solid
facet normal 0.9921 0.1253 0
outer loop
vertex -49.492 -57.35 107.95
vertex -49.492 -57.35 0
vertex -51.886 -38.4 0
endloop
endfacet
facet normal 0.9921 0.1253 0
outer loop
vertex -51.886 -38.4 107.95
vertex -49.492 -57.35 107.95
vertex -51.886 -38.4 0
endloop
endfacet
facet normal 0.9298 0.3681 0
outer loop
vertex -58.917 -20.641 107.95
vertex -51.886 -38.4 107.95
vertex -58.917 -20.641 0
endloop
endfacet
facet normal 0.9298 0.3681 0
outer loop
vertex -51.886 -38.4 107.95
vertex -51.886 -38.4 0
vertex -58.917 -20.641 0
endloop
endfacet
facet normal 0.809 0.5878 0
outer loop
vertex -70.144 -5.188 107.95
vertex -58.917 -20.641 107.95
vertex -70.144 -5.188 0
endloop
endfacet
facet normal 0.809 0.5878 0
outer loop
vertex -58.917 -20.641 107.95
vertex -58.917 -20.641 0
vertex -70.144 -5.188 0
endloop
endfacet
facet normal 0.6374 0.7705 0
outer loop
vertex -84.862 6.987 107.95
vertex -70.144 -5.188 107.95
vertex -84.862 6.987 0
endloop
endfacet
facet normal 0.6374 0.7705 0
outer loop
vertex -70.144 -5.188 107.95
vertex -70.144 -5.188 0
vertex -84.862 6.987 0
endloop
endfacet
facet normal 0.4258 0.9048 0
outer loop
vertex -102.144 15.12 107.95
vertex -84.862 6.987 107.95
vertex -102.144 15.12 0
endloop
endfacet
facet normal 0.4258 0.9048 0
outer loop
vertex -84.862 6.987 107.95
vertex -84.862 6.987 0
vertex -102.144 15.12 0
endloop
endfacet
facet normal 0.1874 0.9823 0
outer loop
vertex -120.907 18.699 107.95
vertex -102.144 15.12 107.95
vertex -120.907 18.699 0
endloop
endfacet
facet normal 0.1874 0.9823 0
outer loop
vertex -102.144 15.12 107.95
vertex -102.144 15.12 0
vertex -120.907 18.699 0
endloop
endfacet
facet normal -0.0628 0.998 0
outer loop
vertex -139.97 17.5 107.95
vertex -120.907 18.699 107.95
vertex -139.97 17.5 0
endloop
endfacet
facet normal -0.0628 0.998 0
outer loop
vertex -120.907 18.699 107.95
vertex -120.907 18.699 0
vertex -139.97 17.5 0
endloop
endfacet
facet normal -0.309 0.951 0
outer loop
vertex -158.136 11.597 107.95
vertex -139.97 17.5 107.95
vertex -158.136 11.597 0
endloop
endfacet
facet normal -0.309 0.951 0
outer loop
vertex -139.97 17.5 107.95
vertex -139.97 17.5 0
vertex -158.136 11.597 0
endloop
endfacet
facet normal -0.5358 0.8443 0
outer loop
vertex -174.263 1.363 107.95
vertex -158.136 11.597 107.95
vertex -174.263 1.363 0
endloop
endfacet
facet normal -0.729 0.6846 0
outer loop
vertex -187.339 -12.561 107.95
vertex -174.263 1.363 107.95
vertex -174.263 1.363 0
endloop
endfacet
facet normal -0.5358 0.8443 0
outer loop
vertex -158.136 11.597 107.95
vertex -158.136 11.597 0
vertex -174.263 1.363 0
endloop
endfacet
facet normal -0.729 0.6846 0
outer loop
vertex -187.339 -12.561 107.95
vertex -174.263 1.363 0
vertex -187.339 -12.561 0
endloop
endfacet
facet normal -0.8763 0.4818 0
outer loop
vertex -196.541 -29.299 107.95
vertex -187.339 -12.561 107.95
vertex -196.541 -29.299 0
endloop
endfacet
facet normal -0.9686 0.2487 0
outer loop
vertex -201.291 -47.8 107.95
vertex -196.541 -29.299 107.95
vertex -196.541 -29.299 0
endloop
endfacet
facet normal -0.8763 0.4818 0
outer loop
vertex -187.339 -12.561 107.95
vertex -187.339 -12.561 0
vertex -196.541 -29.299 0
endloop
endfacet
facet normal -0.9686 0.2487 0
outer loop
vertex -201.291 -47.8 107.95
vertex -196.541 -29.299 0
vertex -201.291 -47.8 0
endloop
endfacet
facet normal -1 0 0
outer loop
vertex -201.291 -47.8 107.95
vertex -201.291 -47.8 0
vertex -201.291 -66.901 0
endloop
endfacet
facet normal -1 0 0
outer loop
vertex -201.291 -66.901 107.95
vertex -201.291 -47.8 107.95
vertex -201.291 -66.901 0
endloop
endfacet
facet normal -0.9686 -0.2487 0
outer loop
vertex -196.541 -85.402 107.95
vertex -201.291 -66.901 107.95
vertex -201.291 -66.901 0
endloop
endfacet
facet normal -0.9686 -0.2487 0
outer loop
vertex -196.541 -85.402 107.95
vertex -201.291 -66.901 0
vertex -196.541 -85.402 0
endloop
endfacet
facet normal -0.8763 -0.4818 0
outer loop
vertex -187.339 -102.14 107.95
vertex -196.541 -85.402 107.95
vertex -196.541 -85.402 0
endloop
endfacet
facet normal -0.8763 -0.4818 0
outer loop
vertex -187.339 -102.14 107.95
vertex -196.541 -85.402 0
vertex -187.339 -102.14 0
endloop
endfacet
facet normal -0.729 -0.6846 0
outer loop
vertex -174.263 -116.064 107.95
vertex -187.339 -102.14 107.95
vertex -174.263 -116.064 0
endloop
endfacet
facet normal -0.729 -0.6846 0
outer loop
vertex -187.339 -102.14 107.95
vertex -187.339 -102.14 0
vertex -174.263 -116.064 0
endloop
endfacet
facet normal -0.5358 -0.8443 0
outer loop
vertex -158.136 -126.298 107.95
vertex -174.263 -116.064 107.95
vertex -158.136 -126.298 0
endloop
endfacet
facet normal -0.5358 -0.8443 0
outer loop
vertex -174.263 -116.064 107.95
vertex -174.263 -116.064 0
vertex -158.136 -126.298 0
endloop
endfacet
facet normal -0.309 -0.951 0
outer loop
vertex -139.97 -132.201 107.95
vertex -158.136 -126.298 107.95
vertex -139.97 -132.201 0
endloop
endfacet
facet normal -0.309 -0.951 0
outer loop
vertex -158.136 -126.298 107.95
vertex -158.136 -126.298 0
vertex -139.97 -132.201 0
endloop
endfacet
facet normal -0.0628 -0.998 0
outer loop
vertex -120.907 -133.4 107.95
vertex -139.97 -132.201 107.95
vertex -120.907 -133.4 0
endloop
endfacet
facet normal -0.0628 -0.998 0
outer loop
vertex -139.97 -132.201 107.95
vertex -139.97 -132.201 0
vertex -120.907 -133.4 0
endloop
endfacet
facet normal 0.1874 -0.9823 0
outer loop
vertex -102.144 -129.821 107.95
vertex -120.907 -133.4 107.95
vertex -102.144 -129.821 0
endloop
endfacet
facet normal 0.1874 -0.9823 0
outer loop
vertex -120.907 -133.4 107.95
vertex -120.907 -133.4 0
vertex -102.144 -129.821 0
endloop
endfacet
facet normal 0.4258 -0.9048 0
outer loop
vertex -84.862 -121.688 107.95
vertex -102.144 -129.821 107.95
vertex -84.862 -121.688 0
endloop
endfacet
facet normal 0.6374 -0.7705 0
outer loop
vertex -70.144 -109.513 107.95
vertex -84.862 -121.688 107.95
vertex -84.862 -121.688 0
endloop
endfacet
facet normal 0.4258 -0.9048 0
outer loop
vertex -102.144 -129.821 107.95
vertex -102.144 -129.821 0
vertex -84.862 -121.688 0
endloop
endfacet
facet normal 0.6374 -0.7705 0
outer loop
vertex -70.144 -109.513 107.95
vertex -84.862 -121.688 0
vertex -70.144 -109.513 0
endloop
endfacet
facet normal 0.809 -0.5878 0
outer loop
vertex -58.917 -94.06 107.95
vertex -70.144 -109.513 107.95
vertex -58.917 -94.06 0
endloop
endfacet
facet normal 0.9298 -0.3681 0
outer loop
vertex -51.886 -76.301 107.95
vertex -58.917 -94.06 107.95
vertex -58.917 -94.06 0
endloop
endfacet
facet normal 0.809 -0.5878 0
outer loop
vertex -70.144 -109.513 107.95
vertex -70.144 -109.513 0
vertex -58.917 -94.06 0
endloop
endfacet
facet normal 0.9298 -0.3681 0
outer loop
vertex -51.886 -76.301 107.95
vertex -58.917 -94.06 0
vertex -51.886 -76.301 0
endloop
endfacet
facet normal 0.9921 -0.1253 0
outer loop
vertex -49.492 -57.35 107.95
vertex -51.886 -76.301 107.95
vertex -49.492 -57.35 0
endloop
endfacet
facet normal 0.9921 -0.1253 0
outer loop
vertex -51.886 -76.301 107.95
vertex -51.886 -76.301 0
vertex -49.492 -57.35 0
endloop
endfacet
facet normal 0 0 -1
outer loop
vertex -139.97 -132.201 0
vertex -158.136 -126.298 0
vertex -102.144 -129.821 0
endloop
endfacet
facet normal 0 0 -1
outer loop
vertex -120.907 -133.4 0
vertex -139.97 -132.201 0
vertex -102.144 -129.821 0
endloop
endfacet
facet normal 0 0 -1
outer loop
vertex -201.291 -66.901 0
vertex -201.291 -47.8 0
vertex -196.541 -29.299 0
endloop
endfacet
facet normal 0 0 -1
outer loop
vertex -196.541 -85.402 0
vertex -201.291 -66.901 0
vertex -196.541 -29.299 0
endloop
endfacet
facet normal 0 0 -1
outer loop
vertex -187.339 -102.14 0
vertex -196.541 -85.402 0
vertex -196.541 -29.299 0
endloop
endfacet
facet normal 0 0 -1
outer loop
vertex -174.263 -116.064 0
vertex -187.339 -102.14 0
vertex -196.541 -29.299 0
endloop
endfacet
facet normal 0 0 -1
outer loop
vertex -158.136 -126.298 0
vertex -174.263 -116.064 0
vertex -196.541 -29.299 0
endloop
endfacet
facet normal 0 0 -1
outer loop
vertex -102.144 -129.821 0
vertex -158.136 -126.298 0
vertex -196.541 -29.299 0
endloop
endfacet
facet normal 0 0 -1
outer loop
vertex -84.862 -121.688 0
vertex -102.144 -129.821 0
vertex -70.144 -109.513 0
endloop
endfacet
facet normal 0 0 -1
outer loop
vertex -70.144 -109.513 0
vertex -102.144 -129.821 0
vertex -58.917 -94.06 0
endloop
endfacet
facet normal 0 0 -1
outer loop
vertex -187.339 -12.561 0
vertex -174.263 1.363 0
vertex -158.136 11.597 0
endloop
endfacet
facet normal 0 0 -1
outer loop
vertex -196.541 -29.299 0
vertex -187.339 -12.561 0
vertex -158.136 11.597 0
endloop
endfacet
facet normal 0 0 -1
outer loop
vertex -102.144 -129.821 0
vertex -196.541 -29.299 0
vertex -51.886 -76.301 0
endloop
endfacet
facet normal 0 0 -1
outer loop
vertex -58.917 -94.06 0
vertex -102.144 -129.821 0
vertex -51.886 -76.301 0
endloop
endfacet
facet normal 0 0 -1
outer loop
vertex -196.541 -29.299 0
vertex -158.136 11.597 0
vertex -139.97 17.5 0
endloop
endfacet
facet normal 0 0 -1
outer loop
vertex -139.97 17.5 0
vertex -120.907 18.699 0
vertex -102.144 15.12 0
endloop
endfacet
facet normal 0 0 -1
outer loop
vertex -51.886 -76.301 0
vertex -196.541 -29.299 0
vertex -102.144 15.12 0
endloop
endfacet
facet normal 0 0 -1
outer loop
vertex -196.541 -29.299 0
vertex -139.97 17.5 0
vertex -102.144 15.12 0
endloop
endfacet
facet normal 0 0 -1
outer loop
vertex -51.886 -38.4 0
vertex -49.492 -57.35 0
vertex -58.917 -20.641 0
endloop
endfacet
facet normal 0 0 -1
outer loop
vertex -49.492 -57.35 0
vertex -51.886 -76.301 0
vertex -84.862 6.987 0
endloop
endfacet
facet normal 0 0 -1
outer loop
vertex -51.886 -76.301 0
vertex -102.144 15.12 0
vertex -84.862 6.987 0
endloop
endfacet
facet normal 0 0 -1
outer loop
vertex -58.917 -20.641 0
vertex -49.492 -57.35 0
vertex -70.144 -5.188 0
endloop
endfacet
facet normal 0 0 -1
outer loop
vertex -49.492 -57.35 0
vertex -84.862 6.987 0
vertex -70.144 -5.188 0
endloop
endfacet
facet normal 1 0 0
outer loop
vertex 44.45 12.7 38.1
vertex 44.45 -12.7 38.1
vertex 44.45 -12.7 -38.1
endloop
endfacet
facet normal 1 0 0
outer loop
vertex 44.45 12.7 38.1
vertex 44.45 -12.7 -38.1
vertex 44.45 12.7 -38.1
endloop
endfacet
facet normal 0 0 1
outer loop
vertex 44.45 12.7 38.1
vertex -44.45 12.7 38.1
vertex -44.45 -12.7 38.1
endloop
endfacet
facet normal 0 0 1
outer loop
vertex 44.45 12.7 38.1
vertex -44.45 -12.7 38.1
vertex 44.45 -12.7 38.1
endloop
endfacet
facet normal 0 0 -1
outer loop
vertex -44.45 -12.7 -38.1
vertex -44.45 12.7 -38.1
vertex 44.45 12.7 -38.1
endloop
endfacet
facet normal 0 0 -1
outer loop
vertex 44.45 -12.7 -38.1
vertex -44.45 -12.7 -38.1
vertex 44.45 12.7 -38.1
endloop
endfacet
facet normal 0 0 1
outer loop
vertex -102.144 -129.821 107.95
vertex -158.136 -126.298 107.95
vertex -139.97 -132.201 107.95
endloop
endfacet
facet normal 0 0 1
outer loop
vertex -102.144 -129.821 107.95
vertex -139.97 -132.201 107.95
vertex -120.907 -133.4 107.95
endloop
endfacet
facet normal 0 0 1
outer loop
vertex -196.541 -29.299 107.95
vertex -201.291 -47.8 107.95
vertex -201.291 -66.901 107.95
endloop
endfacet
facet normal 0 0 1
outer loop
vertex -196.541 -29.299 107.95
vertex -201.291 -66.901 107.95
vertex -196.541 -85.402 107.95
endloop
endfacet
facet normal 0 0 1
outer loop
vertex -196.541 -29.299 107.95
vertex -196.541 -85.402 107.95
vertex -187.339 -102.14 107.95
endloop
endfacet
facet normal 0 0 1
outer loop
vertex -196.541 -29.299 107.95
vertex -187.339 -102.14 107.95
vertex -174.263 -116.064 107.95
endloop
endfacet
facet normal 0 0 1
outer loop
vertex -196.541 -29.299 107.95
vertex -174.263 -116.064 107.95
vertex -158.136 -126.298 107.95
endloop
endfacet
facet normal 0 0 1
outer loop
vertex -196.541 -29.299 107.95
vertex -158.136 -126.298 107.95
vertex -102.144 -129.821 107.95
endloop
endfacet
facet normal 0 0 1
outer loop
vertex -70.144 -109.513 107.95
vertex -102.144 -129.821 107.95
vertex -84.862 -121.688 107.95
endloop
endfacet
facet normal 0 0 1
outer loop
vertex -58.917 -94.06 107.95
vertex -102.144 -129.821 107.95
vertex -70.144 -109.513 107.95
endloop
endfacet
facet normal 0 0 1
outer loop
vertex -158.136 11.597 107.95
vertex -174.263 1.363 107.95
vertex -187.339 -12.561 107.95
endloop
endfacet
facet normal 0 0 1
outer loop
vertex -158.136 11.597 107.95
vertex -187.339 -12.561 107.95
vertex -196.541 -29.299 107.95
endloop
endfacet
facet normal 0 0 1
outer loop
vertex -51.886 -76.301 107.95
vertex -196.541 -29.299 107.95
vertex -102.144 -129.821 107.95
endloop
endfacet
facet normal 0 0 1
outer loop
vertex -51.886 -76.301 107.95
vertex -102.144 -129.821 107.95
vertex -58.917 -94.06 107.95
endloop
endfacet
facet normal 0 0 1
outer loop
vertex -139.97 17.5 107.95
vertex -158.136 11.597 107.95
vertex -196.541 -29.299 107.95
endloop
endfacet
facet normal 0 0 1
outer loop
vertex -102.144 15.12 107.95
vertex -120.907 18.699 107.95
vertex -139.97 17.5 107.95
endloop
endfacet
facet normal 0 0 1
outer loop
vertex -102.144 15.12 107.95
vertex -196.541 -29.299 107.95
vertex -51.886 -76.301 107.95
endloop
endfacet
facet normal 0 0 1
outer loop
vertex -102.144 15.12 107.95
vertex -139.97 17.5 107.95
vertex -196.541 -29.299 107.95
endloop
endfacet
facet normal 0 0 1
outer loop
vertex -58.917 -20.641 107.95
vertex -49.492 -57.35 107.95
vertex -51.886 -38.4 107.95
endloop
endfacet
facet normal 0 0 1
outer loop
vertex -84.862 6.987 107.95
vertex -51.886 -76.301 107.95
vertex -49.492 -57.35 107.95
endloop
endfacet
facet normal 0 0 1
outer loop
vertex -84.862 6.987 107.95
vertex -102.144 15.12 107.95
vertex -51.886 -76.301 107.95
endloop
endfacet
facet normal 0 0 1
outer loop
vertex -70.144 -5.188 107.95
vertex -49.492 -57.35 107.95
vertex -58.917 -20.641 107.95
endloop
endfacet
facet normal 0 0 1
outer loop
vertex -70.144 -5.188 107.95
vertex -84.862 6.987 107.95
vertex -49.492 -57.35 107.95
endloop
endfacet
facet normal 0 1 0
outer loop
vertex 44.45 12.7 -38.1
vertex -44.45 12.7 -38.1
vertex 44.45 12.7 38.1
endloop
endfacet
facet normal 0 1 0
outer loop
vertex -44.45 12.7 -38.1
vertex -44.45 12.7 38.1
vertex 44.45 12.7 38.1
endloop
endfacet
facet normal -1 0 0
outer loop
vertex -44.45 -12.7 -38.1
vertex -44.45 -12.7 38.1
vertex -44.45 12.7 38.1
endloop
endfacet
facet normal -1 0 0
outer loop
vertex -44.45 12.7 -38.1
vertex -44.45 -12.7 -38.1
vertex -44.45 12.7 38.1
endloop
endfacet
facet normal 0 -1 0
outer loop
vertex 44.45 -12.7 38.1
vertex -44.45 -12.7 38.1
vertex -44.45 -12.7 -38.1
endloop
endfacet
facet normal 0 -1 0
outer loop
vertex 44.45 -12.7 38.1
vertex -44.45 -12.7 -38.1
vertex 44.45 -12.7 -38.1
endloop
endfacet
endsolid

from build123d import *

# Parameters (mm, degrees)
F0_W     = 88.9
F0_H     = 25.4
F1_DEPTH = 38.1
F2_R     = 76.2
F3_DEPTH = 107.95


with BuildPart() as f1:
    # F0 (on Top) → F1 (new body, symmetric)
    with BuildSketch(Plane.XY):
        Rectangle(F0_W, F0_H)
    extrude(amount=F1_DEPTH, both=True)


with BuildPart() as f3:
    # F2 (on Top) → F3 (new body)
    with BuildSketch(Plane.XY):
        with Locations((-125.691585, -57.350496)):
            Circle(F2_R)
    extrude(amount=F3_DEPTH)


solid = Compound([f1.part, f3.part])
